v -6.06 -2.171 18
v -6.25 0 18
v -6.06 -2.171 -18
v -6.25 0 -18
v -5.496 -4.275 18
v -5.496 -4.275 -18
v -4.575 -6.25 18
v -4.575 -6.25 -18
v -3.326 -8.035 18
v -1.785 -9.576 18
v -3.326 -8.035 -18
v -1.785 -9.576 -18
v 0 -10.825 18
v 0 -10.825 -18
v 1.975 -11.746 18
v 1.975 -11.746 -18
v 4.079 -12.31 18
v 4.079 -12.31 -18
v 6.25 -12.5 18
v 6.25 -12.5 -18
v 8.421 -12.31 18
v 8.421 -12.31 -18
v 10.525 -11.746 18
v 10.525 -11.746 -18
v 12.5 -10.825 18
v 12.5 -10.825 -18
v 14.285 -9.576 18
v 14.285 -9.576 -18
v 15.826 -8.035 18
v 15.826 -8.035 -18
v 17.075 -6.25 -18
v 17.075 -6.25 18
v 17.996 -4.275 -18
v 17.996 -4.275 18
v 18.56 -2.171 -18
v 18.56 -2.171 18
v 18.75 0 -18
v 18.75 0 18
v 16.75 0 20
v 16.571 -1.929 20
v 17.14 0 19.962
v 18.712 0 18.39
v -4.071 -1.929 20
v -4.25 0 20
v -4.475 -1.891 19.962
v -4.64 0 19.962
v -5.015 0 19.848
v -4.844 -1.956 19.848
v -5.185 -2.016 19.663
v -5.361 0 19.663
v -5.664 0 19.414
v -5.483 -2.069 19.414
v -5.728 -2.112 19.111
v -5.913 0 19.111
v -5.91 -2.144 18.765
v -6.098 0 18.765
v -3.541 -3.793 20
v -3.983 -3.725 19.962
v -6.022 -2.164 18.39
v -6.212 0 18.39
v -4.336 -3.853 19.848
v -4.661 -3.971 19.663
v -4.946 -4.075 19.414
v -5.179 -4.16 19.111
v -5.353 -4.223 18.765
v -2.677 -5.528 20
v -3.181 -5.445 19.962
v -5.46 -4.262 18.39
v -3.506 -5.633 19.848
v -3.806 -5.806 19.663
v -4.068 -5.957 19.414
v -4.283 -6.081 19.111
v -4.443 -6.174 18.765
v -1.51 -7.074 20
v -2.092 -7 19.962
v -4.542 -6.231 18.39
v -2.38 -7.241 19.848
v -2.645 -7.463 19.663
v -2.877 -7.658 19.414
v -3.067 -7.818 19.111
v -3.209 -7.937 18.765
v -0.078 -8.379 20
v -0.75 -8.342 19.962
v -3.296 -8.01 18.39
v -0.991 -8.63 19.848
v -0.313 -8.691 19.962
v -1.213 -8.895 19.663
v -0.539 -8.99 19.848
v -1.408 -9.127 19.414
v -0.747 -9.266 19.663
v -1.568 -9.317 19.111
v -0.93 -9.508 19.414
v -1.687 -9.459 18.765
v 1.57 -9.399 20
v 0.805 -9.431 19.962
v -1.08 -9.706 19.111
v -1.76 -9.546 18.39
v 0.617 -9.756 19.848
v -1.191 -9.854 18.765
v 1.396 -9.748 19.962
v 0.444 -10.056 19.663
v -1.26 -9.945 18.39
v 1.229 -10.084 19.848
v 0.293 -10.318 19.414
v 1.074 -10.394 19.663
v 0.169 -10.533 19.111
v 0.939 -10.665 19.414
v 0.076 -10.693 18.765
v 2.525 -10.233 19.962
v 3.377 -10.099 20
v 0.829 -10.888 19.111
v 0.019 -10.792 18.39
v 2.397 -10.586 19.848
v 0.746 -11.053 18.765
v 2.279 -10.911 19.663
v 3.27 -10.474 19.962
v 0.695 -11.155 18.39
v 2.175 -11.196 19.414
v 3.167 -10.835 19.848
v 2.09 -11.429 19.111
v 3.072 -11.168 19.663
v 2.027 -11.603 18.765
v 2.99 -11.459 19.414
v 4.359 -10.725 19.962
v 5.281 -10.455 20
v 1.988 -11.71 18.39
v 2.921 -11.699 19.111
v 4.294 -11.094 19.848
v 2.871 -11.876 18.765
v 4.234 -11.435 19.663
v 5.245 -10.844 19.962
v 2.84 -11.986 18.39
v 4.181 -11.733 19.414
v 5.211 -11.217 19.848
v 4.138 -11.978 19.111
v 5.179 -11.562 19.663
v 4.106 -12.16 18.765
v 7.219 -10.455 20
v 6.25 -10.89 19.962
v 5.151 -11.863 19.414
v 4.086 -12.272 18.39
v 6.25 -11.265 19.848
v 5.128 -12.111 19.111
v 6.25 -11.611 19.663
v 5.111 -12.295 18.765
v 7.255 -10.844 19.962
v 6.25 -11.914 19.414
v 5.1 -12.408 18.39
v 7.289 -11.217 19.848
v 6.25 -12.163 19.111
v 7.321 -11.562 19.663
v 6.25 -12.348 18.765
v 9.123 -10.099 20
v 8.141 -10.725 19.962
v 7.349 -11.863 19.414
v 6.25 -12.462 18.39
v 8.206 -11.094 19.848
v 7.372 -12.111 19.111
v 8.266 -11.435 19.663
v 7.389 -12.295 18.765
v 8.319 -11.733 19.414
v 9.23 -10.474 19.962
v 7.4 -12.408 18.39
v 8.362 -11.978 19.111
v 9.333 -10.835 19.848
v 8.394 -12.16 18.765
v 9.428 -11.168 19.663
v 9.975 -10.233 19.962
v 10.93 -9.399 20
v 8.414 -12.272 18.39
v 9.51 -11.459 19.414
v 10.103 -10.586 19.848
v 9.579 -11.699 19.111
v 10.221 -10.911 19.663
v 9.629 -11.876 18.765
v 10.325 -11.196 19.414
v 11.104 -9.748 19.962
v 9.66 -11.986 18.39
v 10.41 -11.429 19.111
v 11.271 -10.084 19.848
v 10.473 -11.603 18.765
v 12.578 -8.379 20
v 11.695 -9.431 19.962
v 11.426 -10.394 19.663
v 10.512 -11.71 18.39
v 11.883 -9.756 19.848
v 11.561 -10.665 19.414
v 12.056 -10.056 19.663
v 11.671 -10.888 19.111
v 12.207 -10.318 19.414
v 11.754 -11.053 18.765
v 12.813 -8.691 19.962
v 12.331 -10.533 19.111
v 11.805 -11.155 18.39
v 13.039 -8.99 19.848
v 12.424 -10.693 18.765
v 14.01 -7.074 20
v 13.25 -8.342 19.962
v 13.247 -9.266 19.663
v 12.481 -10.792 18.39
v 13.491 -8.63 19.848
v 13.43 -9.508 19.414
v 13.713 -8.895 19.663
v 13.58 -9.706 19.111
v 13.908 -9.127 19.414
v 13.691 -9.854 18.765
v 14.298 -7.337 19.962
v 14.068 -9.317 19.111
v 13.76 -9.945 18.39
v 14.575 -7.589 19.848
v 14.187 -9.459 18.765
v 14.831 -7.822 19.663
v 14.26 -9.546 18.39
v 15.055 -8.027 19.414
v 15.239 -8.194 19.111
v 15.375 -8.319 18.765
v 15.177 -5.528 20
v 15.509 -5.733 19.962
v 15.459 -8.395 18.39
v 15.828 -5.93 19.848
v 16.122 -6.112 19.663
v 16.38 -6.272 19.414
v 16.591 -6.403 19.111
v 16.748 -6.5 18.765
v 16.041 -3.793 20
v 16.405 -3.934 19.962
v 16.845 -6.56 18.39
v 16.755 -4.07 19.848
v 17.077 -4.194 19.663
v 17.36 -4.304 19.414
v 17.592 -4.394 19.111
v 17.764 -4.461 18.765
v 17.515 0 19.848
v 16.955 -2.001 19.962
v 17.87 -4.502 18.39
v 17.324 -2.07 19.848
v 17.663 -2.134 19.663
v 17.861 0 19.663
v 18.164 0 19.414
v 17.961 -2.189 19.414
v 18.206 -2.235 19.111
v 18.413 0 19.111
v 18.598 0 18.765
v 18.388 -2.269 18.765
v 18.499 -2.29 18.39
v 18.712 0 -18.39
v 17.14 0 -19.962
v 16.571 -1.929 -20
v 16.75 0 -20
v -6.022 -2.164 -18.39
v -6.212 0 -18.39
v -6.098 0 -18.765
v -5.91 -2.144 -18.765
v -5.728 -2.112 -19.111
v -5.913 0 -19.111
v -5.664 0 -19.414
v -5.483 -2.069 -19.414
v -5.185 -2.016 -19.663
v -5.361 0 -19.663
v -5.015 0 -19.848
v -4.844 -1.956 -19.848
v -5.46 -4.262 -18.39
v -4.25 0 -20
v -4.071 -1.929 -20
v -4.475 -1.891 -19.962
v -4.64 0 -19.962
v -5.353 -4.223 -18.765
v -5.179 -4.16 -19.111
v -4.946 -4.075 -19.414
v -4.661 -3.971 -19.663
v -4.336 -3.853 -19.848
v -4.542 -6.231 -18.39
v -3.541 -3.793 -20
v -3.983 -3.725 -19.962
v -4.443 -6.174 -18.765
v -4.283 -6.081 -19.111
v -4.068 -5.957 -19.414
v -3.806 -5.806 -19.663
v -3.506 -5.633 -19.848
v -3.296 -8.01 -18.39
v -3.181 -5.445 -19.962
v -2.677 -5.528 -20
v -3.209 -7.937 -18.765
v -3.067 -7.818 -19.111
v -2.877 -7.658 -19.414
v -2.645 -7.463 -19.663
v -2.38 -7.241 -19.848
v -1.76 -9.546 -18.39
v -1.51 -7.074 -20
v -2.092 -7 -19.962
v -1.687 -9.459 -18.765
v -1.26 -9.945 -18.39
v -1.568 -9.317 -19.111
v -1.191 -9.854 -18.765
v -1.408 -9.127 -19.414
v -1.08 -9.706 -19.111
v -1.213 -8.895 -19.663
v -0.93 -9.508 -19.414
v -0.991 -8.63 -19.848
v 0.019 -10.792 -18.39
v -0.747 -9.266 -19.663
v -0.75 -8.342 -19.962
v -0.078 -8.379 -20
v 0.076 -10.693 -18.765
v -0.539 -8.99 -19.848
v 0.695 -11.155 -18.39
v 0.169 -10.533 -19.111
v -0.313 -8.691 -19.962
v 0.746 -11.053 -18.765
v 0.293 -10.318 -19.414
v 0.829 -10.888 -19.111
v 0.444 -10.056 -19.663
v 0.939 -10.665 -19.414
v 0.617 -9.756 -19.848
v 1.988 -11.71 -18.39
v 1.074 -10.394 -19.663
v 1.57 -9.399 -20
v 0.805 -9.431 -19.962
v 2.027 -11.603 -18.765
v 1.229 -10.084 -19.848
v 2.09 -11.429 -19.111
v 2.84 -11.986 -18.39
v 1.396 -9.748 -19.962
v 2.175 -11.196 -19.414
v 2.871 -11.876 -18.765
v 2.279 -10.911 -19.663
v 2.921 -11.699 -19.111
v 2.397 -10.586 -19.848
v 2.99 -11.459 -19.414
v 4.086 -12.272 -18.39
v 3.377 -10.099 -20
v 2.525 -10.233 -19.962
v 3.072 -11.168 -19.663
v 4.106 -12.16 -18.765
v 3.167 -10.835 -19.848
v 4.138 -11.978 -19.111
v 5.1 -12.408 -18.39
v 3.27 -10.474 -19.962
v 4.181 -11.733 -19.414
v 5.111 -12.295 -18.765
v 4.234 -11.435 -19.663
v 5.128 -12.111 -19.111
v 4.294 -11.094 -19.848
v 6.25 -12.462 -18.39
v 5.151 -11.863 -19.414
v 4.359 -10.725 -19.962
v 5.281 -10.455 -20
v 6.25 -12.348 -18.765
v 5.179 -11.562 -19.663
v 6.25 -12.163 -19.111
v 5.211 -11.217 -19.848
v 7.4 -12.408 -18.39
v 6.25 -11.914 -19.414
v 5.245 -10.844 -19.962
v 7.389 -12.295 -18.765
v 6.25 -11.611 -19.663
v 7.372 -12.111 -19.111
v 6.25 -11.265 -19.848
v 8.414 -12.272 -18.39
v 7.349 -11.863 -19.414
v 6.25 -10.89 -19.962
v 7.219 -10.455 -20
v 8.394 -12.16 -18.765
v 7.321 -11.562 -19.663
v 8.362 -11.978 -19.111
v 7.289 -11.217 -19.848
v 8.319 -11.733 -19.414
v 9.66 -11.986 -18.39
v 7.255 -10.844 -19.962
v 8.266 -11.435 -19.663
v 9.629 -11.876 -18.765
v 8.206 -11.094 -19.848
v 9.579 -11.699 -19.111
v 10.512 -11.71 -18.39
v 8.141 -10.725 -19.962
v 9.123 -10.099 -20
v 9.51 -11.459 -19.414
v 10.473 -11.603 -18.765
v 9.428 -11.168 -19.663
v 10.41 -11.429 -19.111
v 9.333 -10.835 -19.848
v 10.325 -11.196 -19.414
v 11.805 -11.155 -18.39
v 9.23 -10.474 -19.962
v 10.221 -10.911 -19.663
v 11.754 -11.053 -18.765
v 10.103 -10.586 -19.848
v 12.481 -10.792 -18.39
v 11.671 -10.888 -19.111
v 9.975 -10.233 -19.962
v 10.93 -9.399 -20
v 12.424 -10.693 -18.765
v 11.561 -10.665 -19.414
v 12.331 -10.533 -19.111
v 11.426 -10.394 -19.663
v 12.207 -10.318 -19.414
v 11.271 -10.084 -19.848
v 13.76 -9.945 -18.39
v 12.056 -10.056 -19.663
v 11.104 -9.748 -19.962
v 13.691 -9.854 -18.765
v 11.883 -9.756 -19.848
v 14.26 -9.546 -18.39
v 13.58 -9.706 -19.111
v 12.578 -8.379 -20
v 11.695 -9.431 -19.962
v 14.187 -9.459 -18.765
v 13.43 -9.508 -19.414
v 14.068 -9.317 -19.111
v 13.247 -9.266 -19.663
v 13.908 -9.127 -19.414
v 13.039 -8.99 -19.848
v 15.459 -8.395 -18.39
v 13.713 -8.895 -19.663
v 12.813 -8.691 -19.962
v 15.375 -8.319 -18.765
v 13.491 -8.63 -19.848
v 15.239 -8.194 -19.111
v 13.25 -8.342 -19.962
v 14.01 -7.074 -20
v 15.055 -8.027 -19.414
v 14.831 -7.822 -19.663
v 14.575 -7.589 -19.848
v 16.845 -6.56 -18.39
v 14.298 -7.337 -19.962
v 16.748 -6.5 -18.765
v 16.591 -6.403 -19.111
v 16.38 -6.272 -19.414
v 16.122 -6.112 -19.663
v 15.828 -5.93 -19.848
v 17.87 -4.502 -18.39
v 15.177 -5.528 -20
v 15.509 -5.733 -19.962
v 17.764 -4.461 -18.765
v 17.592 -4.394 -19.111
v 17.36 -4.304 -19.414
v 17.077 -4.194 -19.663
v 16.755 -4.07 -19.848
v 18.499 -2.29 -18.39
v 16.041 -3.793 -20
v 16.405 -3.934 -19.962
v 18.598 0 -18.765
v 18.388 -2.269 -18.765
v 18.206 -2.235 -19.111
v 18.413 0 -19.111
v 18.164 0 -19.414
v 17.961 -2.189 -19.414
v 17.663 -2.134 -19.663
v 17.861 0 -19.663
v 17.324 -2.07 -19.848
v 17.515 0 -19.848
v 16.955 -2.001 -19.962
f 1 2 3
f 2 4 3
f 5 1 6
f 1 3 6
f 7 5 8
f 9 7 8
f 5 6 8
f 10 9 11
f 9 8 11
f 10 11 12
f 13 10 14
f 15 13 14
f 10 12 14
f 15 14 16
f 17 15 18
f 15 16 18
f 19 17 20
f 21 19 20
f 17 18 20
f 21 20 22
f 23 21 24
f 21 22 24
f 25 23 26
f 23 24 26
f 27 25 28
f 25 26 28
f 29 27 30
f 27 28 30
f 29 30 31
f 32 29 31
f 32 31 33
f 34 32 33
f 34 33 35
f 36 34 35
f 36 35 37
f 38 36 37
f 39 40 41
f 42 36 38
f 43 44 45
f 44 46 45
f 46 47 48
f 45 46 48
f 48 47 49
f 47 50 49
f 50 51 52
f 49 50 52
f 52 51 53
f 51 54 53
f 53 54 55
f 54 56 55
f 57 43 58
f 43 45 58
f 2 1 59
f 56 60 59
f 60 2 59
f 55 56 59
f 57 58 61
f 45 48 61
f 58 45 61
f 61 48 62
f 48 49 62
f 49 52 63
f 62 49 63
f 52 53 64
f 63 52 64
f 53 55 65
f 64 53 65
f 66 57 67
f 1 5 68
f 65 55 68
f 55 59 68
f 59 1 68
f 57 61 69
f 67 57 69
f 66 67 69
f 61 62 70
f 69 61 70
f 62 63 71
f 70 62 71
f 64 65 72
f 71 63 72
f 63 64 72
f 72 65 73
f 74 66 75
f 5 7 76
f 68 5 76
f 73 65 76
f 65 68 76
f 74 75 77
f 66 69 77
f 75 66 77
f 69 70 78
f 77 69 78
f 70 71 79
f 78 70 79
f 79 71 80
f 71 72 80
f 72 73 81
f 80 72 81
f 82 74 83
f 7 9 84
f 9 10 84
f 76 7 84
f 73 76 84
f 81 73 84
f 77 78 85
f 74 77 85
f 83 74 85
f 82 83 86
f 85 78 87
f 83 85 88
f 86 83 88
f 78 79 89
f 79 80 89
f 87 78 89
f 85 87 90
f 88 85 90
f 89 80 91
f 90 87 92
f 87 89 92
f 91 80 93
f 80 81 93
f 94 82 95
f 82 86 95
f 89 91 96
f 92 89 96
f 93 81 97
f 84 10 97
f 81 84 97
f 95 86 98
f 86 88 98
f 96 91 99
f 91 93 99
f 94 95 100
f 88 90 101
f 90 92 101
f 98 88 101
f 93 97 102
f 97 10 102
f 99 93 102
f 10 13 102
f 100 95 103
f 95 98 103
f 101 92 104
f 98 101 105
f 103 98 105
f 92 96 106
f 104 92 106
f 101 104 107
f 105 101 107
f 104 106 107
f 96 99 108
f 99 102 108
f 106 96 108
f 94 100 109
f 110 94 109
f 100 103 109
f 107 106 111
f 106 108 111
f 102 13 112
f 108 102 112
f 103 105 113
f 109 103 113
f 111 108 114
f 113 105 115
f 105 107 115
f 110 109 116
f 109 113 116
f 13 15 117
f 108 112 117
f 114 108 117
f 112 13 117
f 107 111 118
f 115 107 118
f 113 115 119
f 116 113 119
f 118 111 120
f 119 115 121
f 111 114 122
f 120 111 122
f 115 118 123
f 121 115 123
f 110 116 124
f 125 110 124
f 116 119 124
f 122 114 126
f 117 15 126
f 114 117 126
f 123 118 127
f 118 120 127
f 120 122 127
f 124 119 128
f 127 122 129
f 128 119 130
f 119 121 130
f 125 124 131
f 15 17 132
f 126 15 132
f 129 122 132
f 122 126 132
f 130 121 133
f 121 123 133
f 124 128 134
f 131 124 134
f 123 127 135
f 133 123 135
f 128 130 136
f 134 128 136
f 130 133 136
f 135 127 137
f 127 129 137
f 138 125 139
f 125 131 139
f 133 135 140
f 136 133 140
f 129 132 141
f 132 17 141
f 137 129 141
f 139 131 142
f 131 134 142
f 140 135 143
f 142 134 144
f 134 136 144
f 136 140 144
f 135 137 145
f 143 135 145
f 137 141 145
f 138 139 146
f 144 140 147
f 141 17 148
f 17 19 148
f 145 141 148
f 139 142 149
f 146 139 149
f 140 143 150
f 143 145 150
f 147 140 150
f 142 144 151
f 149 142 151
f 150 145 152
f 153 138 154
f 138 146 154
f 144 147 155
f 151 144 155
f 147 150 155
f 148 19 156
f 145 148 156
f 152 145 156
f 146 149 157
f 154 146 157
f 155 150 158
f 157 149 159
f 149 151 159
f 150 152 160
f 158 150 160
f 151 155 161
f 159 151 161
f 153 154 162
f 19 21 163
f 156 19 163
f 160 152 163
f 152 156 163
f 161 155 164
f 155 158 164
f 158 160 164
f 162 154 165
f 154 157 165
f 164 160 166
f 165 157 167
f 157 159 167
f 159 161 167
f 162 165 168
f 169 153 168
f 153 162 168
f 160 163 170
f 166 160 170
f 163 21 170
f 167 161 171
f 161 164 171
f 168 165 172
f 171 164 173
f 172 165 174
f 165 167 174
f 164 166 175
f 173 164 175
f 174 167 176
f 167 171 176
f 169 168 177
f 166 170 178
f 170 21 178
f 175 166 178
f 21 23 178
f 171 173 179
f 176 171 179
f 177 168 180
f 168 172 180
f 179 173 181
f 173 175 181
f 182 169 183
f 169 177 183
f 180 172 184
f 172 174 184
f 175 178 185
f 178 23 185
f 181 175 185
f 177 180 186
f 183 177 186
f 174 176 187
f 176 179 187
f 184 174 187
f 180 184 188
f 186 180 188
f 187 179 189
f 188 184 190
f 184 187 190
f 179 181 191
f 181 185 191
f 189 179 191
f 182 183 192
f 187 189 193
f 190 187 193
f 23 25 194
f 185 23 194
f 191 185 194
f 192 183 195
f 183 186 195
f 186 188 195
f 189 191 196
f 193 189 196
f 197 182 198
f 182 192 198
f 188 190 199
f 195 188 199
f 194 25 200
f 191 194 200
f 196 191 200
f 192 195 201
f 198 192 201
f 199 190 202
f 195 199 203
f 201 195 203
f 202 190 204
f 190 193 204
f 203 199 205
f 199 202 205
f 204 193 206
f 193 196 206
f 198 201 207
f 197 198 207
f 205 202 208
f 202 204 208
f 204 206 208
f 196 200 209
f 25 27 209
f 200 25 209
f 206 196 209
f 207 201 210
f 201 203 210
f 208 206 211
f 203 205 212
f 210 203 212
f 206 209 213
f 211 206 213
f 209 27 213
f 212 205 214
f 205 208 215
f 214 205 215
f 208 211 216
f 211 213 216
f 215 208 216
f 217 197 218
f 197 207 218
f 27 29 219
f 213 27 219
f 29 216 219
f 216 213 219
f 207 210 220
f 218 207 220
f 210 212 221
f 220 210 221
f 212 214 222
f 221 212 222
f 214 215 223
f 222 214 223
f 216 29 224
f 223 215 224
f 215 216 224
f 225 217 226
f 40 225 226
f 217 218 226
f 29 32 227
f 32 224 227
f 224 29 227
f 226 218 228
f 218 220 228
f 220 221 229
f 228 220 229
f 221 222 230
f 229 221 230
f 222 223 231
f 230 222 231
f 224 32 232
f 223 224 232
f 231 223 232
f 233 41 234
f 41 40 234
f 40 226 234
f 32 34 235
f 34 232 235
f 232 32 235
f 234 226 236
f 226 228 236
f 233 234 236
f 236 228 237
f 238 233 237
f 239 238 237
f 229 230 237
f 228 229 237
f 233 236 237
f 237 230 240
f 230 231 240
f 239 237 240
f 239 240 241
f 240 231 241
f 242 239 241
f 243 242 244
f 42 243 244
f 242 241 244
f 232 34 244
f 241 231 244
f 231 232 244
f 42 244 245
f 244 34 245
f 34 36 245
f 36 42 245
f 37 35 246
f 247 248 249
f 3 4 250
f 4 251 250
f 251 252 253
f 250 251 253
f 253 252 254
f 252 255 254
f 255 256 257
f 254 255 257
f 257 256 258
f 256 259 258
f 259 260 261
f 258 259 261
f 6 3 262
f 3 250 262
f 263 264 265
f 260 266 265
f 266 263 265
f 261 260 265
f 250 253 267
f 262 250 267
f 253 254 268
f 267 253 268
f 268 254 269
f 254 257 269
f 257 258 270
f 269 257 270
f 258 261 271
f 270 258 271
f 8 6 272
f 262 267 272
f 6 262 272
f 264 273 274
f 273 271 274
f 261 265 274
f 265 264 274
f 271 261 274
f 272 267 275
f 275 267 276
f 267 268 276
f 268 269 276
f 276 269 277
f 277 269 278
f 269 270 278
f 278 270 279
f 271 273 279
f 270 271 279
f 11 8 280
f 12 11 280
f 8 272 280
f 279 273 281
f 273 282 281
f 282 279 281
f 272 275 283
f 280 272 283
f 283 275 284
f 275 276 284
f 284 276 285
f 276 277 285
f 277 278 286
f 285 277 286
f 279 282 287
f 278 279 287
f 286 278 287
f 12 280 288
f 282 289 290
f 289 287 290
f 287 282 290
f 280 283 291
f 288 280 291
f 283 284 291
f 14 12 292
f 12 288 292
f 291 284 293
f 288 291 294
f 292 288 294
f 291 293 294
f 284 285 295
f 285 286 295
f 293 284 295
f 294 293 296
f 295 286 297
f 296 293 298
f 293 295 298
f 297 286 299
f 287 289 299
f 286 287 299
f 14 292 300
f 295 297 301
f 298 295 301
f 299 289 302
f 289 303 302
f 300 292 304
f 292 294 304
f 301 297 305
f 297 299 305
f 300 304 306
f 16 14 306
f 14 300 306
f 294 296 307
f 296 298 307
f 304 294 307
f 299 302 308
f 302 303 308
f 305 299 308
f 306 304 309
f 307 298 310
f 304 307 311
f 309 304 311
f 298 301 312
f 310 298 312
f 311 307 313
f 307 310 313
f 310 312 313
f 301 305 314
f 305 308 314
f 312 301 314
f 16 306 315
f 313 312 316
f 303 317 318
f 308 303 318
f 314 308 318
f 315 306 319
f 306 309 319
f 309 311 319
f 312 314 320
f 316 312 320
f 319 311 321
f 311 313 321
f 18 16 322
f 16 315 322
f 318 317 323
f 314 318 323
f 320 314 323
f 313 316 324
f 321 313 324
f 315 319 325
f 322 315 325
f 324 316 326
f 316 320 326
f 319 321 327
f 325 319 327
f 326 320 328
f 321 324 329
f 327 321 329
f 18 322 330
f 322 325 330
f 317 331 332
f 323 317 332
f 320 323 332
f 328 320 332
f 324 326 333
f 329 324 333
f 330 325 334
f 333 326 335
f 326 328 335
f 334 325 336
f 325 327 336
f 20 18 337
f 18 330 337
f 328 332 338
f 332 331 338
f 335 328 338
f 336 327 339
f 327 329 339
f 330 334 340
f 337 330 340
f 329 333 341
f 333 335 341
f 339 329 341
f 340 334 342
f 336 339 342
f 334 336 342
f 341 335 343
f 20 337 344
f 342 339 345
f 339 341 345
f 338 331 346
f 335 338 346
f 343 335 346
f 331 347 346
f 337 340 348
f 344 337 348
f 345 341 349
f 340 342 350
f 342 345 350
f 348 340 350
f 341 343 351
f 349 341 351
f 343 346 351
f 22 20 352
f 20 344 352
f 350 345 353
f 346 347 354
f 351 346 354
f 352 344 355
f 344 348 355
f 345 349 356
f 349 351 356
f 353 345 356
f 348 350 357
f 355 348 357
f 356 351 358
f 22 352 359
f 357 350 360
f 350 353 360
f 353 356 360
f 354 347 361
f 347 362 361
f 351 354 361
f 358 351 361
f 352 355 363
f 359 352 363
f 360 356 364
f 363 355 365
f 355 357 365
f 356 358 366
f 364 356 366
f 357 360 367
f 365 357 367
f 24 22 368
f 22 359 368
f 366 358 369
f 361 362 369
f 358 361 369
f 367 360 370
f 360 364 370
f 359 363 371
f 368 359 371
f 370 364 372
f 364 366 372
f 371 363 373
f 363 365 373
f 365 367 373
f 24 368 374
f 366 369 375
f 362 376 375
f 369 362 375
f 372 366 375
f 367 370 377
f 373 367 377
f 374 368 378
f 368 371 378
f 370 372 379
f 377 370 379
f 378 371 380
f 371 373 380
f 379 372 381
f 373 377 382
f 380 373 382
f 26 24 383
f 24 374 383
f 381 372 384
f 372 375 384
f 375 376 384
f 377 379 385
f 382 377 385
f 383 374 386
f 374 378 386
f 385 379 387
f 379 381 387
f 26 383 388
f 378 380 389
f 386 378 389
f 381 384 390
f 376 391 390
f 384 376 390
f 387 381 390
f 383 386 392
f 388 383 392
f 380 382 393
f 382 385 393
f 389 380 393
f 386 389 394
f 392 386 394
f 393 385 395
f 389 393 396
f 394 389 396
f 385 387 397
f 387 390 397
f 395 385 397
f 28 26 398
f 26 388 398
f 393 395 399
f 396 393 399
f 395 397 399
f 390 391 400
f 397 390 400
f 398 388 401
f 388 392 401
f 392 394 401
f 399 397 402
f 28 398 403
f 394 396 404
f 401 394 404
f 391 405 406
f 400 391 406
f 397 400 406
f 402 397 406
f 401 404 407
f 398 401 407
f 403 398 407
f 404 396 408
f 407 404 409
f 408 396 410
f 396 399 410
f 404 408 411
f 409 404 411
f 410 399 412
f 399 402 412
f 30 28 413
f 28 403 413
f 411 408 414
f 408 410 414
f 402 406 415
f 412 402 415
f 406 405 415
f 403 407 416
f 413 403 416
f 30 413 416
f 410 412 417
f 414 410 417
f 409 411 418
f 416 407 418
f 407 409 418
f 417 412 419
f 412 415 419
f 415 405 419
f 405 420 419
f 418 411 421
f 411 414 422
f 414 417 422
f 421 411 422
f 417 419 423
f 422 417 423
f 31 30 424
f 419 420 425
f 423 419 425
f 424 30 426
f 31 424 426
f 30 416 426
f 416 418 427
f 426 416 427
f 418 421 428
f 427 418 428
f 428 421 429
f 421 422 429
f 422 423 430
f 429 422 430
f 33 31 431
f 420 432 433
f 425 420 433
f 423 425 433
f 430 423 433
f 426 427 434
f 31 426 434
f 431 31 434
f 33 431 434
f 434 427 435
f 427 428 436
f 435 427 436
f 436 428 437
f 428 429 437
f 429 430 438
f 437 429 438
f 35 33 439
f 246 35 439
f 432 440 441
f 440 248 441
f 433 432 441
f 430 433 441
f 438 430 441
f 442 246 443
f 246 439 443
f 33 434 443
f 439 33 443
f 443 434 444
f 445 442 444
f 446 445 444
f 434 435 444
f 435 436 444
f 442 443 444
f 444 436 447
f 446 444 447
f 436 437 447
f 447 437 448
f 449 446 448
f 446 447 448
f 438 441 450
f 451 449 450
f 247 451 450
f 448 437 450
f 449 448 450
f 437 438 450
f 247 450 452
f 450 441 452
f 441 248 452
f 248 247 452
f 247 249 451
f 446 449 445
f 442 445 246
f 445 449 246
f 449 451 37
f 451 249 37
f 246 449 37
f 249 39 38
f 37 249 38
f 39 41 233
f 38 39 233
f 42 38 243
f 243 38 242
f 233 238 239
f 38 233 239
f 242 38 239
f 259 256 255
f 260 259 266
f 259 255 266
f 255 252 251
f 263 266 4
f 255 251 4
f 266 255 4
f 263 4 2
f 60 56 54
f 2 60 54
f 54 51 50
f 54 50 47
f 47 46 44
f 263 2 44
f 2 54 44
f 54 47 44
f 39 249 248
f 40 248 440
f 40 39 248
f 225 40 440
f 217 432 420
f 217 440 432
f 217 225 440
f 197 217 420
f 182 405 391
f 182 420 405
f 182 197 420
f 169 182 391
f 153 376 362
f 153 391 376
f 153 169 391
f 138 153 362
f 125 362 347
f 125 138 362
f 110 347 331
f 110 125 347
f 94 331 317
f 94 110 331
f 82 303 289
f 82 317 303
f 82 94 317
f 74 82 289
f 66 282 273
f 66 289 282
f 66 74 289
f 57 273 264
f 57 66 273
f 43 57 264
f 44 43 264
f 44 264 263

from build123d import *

# Parameters (mm, degrees)
F1_ANGLE = 180
F3_DEPTH = 40


with BuildPart() as f1:
    # F0 (on Front) → F1 (revolve)
    with BuildSketch(Plane.XZ):
        with BuildLine():
            Line((6.25, 20), (-4.25, 20))
            ThreePointArc((-4.25, 20), (-5.664214, 19.414214), (-6.25, 18))
            Line((-6.25, 18), (-6.25, -18))
            ThreePointArc((-6.25, -18), (-5.664214, -19.414214), (-4.25, -20))
            Line((-4.25, -20), (6.25, -20))
            Line((6.25, -20), (6.25, 20))
        make_face()
    revolve(axis=Axis((6.25, 0, 0), (0, 0, -1)), revolution_arc=F1_ANGLE)

    # F2 (on face) → F3 (cut)
    with BuildSketch(Plane.XY.offset(20)):
        with BuildLine():
            Line((-4.25, 0), (16.75, 0))
            ThreePointArc((16.75, 0), (6.25, 10.5), (-4.25, 0))
        make_face()
        with BuildLine():
            ThreePointArc((-4.25, 0), (6.25, -10.5), (16.75, 0))
            Line((16.75, 0), (-4.25, 0))
        make_face()
    extrude(amount=-F3_DEPTH, mode=Mode.SUBTRACT)


with BuildPart() as f4_1:
    # F4: instance of F1
    add(f1.part.mirror(Plane.XZ))


solid = f4_1.part
